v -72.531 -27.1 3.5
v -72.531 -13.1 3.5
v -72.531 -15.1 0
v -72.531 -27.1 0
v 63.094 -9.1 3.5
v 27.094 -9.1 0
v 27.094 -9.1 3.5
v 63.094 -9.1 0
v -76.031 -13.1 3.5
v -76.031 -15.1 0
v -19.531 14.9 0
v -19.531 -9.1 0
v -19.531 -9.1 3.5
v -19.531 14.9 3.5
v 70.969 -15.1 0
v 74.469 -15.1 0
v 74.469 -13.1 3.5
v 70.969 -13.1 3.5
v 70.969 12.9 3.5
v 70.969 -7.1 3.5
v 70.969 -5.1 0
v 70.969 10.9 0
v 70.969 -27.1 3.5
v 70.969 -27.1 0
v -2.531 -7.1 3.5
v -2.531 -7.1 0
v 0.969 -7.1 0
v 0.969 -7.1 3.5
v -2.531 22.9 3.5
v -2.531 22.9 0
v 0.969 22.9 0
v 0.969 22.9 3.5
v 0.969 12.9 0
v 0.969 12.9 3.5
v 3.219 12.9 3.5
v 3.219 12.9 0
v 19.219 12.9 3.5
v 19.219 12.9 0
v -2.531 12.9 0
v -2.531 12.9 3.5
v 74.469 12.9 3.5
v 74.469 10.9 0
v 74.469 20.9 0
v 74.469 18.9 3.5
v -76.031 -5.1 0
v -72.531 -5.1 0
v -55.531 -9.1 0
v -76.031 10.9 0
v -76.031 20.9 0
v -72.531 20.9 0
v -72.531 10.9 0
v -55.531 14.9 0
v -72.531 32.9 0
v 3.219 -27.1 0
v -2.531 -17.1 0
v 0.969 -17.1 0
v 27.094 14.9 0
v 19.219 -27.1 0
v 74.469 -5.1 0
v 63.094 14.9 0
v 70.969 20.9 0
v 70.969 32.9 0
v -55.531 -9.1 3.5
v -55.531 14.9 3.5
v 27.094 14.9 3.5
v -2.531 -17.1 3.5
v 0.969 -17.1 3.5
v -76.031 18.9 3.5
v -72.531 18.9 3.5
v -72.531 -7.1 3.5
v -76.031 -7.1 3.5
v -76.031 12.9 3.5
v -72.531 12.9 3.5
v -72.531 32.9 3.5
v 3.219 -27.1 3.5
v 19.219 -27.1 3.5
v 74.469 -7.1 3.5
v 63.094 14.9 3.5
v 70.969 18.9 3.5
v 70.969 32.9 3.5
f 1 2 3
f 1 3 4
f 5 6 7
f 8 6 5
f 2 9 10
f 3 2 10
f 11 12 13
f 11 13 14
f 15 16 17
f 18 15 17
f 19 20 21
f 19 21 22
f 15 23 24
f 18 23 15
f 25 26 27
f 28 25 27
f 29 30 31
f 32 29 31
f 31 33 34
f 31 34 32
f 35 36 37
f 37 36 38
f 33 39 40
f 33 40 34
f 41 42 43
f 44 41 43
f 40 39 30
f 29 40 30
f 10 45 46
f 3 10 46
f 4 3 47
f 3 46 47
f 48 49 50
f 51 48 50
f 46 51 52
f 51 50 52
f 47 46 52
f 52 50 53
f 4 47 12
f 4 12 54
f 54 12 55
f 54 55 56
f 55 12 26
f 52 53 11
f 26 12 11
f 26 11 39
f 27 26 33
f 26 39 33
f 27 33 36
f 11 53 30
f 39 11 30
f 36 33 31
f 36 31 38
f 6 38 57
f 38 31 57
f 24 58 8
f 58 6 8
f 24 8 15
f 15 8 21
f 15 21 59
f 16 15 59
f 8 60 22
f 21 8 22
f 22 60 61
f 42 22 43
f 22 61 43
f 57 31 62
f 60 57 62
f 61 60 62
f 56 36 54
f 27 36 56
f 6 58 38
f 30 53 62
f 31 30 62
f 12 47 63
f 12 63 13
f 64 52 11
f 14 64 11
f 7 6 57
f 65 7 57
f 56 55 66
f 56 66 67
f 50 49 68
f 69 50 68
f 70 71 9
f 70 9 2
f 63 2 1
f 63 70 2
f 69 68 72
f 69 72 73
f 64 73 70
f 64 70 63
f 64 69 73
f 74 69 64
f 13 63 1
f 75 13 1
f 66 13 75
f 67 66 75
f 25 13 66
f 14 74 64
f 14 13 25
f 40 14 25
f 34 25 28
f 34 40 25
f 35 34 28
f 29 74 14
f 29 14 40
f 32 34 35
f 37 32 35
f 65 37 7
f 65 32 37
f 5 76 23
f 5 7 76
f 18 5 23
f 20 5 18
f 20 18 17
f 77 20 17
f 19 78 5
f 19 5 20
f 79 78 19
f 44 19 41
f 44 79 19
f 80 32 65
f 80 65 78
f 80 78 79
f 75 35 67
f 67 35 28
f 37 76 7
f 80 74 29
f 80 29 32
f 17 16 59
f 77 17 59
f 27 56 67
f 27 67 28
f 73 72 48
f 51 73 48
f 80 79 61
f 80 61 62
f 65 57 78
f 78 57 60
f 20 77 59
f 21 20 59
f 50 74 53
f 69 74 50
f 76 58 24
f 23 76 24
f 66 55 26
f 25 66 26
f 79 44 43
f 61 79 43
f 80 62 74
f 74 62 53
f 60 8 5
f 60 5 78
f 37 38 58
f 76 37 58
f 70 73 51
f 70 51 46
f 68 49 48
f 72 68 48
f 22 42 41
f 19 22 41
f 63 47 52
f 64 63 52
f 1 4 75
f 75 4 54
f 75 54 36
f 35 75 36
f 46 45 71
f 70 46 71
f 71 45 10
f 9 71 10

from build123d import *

# Parameters (mm, degrees)
F0_W     = 3.5
F0_H     = 10
F0_W_2   = 36
F0_H_2   = 24
F1_DEPTH = 3.5
F3_DEPTH = 3.5
F5_DEPTH = 3.5


with BuildPart() as f1:
    # F0 (on Top) → F1 (new body)
    with BuildSketch(Plane.XY):
        Polygon((19.218762, 12.900007), (19.218762, -27.099993), (74.468762, -27.099993), (74.468762, 32.900007), (-76.031238, 32.900007), (-76.031238, -27.099993), (3.218762, -27.099993), (3.218762, 12.900007), align=None)
        with Locations((-0.781238, -12.099993)):
            Rectangle(F0_W, F0_H, mode=Mode.SUBTRACT)
        with Locations((-37.531238, 2.900007)):
            Rectangle(F0_W_2, F0_H_2, mode=Mode.SUBTRACT)
        with Locations((-0.781238, 17.900007)):
            Rectangle(F0_W, F0_H, mode=Mode.SUBTRACT)
        with Locations((45.093762, 2.900007)):
            Rectangle(F0_W_2, F0_H_2, mode=Mode.SUBTRACT)
    extrude(amount=F1_DEPTH)

    # F2 (on face) → F3 (cut)
    with BuildSketch(Plane.YZ.offset(74.468762)):
        Polygon((-27.099993, 3.5), (-27.099993, 0), (-15.099993, 0), (-13.099993, 3.5), align=None)
        Polygon((-7.099993, 3.5), (-5.099993, 0), (10.900007, 0), (12.900007, 3.5), align=None)
        Polygon((18.900007, 3.5), (20.900007, 0), (32.900007, 0), (32.900007, 3.5), align=None)
    extrude(amount=-F3_DEPTH, mode=Mode.SUBTRACT)

    # F4 (on face) → F5 (cut)
    with BuildSketch(Plane(origin=(-76.031238, 0, 0), x_dir=(0, -1, 0), z_dir=(-1, 0, 0))):
        Polygon((27.099993, 3.5), (13.099993, 3.5), (15.099993, 0), (27.099993, 0), align=None)
        Polygon((7.099993, 3.5), (-12.900007, 3.5), (-10.900007, 0), (5.099993, 0), align=None)
        Polygon((-18.900007, 3.5), (-32.900007, 3.5), (-32.900007, 0), (-20.900007, 0), align=None)
    extrude(amount=-F5_DEPTH, mode=Mode.SUBTRACT)


solid = f1.part
